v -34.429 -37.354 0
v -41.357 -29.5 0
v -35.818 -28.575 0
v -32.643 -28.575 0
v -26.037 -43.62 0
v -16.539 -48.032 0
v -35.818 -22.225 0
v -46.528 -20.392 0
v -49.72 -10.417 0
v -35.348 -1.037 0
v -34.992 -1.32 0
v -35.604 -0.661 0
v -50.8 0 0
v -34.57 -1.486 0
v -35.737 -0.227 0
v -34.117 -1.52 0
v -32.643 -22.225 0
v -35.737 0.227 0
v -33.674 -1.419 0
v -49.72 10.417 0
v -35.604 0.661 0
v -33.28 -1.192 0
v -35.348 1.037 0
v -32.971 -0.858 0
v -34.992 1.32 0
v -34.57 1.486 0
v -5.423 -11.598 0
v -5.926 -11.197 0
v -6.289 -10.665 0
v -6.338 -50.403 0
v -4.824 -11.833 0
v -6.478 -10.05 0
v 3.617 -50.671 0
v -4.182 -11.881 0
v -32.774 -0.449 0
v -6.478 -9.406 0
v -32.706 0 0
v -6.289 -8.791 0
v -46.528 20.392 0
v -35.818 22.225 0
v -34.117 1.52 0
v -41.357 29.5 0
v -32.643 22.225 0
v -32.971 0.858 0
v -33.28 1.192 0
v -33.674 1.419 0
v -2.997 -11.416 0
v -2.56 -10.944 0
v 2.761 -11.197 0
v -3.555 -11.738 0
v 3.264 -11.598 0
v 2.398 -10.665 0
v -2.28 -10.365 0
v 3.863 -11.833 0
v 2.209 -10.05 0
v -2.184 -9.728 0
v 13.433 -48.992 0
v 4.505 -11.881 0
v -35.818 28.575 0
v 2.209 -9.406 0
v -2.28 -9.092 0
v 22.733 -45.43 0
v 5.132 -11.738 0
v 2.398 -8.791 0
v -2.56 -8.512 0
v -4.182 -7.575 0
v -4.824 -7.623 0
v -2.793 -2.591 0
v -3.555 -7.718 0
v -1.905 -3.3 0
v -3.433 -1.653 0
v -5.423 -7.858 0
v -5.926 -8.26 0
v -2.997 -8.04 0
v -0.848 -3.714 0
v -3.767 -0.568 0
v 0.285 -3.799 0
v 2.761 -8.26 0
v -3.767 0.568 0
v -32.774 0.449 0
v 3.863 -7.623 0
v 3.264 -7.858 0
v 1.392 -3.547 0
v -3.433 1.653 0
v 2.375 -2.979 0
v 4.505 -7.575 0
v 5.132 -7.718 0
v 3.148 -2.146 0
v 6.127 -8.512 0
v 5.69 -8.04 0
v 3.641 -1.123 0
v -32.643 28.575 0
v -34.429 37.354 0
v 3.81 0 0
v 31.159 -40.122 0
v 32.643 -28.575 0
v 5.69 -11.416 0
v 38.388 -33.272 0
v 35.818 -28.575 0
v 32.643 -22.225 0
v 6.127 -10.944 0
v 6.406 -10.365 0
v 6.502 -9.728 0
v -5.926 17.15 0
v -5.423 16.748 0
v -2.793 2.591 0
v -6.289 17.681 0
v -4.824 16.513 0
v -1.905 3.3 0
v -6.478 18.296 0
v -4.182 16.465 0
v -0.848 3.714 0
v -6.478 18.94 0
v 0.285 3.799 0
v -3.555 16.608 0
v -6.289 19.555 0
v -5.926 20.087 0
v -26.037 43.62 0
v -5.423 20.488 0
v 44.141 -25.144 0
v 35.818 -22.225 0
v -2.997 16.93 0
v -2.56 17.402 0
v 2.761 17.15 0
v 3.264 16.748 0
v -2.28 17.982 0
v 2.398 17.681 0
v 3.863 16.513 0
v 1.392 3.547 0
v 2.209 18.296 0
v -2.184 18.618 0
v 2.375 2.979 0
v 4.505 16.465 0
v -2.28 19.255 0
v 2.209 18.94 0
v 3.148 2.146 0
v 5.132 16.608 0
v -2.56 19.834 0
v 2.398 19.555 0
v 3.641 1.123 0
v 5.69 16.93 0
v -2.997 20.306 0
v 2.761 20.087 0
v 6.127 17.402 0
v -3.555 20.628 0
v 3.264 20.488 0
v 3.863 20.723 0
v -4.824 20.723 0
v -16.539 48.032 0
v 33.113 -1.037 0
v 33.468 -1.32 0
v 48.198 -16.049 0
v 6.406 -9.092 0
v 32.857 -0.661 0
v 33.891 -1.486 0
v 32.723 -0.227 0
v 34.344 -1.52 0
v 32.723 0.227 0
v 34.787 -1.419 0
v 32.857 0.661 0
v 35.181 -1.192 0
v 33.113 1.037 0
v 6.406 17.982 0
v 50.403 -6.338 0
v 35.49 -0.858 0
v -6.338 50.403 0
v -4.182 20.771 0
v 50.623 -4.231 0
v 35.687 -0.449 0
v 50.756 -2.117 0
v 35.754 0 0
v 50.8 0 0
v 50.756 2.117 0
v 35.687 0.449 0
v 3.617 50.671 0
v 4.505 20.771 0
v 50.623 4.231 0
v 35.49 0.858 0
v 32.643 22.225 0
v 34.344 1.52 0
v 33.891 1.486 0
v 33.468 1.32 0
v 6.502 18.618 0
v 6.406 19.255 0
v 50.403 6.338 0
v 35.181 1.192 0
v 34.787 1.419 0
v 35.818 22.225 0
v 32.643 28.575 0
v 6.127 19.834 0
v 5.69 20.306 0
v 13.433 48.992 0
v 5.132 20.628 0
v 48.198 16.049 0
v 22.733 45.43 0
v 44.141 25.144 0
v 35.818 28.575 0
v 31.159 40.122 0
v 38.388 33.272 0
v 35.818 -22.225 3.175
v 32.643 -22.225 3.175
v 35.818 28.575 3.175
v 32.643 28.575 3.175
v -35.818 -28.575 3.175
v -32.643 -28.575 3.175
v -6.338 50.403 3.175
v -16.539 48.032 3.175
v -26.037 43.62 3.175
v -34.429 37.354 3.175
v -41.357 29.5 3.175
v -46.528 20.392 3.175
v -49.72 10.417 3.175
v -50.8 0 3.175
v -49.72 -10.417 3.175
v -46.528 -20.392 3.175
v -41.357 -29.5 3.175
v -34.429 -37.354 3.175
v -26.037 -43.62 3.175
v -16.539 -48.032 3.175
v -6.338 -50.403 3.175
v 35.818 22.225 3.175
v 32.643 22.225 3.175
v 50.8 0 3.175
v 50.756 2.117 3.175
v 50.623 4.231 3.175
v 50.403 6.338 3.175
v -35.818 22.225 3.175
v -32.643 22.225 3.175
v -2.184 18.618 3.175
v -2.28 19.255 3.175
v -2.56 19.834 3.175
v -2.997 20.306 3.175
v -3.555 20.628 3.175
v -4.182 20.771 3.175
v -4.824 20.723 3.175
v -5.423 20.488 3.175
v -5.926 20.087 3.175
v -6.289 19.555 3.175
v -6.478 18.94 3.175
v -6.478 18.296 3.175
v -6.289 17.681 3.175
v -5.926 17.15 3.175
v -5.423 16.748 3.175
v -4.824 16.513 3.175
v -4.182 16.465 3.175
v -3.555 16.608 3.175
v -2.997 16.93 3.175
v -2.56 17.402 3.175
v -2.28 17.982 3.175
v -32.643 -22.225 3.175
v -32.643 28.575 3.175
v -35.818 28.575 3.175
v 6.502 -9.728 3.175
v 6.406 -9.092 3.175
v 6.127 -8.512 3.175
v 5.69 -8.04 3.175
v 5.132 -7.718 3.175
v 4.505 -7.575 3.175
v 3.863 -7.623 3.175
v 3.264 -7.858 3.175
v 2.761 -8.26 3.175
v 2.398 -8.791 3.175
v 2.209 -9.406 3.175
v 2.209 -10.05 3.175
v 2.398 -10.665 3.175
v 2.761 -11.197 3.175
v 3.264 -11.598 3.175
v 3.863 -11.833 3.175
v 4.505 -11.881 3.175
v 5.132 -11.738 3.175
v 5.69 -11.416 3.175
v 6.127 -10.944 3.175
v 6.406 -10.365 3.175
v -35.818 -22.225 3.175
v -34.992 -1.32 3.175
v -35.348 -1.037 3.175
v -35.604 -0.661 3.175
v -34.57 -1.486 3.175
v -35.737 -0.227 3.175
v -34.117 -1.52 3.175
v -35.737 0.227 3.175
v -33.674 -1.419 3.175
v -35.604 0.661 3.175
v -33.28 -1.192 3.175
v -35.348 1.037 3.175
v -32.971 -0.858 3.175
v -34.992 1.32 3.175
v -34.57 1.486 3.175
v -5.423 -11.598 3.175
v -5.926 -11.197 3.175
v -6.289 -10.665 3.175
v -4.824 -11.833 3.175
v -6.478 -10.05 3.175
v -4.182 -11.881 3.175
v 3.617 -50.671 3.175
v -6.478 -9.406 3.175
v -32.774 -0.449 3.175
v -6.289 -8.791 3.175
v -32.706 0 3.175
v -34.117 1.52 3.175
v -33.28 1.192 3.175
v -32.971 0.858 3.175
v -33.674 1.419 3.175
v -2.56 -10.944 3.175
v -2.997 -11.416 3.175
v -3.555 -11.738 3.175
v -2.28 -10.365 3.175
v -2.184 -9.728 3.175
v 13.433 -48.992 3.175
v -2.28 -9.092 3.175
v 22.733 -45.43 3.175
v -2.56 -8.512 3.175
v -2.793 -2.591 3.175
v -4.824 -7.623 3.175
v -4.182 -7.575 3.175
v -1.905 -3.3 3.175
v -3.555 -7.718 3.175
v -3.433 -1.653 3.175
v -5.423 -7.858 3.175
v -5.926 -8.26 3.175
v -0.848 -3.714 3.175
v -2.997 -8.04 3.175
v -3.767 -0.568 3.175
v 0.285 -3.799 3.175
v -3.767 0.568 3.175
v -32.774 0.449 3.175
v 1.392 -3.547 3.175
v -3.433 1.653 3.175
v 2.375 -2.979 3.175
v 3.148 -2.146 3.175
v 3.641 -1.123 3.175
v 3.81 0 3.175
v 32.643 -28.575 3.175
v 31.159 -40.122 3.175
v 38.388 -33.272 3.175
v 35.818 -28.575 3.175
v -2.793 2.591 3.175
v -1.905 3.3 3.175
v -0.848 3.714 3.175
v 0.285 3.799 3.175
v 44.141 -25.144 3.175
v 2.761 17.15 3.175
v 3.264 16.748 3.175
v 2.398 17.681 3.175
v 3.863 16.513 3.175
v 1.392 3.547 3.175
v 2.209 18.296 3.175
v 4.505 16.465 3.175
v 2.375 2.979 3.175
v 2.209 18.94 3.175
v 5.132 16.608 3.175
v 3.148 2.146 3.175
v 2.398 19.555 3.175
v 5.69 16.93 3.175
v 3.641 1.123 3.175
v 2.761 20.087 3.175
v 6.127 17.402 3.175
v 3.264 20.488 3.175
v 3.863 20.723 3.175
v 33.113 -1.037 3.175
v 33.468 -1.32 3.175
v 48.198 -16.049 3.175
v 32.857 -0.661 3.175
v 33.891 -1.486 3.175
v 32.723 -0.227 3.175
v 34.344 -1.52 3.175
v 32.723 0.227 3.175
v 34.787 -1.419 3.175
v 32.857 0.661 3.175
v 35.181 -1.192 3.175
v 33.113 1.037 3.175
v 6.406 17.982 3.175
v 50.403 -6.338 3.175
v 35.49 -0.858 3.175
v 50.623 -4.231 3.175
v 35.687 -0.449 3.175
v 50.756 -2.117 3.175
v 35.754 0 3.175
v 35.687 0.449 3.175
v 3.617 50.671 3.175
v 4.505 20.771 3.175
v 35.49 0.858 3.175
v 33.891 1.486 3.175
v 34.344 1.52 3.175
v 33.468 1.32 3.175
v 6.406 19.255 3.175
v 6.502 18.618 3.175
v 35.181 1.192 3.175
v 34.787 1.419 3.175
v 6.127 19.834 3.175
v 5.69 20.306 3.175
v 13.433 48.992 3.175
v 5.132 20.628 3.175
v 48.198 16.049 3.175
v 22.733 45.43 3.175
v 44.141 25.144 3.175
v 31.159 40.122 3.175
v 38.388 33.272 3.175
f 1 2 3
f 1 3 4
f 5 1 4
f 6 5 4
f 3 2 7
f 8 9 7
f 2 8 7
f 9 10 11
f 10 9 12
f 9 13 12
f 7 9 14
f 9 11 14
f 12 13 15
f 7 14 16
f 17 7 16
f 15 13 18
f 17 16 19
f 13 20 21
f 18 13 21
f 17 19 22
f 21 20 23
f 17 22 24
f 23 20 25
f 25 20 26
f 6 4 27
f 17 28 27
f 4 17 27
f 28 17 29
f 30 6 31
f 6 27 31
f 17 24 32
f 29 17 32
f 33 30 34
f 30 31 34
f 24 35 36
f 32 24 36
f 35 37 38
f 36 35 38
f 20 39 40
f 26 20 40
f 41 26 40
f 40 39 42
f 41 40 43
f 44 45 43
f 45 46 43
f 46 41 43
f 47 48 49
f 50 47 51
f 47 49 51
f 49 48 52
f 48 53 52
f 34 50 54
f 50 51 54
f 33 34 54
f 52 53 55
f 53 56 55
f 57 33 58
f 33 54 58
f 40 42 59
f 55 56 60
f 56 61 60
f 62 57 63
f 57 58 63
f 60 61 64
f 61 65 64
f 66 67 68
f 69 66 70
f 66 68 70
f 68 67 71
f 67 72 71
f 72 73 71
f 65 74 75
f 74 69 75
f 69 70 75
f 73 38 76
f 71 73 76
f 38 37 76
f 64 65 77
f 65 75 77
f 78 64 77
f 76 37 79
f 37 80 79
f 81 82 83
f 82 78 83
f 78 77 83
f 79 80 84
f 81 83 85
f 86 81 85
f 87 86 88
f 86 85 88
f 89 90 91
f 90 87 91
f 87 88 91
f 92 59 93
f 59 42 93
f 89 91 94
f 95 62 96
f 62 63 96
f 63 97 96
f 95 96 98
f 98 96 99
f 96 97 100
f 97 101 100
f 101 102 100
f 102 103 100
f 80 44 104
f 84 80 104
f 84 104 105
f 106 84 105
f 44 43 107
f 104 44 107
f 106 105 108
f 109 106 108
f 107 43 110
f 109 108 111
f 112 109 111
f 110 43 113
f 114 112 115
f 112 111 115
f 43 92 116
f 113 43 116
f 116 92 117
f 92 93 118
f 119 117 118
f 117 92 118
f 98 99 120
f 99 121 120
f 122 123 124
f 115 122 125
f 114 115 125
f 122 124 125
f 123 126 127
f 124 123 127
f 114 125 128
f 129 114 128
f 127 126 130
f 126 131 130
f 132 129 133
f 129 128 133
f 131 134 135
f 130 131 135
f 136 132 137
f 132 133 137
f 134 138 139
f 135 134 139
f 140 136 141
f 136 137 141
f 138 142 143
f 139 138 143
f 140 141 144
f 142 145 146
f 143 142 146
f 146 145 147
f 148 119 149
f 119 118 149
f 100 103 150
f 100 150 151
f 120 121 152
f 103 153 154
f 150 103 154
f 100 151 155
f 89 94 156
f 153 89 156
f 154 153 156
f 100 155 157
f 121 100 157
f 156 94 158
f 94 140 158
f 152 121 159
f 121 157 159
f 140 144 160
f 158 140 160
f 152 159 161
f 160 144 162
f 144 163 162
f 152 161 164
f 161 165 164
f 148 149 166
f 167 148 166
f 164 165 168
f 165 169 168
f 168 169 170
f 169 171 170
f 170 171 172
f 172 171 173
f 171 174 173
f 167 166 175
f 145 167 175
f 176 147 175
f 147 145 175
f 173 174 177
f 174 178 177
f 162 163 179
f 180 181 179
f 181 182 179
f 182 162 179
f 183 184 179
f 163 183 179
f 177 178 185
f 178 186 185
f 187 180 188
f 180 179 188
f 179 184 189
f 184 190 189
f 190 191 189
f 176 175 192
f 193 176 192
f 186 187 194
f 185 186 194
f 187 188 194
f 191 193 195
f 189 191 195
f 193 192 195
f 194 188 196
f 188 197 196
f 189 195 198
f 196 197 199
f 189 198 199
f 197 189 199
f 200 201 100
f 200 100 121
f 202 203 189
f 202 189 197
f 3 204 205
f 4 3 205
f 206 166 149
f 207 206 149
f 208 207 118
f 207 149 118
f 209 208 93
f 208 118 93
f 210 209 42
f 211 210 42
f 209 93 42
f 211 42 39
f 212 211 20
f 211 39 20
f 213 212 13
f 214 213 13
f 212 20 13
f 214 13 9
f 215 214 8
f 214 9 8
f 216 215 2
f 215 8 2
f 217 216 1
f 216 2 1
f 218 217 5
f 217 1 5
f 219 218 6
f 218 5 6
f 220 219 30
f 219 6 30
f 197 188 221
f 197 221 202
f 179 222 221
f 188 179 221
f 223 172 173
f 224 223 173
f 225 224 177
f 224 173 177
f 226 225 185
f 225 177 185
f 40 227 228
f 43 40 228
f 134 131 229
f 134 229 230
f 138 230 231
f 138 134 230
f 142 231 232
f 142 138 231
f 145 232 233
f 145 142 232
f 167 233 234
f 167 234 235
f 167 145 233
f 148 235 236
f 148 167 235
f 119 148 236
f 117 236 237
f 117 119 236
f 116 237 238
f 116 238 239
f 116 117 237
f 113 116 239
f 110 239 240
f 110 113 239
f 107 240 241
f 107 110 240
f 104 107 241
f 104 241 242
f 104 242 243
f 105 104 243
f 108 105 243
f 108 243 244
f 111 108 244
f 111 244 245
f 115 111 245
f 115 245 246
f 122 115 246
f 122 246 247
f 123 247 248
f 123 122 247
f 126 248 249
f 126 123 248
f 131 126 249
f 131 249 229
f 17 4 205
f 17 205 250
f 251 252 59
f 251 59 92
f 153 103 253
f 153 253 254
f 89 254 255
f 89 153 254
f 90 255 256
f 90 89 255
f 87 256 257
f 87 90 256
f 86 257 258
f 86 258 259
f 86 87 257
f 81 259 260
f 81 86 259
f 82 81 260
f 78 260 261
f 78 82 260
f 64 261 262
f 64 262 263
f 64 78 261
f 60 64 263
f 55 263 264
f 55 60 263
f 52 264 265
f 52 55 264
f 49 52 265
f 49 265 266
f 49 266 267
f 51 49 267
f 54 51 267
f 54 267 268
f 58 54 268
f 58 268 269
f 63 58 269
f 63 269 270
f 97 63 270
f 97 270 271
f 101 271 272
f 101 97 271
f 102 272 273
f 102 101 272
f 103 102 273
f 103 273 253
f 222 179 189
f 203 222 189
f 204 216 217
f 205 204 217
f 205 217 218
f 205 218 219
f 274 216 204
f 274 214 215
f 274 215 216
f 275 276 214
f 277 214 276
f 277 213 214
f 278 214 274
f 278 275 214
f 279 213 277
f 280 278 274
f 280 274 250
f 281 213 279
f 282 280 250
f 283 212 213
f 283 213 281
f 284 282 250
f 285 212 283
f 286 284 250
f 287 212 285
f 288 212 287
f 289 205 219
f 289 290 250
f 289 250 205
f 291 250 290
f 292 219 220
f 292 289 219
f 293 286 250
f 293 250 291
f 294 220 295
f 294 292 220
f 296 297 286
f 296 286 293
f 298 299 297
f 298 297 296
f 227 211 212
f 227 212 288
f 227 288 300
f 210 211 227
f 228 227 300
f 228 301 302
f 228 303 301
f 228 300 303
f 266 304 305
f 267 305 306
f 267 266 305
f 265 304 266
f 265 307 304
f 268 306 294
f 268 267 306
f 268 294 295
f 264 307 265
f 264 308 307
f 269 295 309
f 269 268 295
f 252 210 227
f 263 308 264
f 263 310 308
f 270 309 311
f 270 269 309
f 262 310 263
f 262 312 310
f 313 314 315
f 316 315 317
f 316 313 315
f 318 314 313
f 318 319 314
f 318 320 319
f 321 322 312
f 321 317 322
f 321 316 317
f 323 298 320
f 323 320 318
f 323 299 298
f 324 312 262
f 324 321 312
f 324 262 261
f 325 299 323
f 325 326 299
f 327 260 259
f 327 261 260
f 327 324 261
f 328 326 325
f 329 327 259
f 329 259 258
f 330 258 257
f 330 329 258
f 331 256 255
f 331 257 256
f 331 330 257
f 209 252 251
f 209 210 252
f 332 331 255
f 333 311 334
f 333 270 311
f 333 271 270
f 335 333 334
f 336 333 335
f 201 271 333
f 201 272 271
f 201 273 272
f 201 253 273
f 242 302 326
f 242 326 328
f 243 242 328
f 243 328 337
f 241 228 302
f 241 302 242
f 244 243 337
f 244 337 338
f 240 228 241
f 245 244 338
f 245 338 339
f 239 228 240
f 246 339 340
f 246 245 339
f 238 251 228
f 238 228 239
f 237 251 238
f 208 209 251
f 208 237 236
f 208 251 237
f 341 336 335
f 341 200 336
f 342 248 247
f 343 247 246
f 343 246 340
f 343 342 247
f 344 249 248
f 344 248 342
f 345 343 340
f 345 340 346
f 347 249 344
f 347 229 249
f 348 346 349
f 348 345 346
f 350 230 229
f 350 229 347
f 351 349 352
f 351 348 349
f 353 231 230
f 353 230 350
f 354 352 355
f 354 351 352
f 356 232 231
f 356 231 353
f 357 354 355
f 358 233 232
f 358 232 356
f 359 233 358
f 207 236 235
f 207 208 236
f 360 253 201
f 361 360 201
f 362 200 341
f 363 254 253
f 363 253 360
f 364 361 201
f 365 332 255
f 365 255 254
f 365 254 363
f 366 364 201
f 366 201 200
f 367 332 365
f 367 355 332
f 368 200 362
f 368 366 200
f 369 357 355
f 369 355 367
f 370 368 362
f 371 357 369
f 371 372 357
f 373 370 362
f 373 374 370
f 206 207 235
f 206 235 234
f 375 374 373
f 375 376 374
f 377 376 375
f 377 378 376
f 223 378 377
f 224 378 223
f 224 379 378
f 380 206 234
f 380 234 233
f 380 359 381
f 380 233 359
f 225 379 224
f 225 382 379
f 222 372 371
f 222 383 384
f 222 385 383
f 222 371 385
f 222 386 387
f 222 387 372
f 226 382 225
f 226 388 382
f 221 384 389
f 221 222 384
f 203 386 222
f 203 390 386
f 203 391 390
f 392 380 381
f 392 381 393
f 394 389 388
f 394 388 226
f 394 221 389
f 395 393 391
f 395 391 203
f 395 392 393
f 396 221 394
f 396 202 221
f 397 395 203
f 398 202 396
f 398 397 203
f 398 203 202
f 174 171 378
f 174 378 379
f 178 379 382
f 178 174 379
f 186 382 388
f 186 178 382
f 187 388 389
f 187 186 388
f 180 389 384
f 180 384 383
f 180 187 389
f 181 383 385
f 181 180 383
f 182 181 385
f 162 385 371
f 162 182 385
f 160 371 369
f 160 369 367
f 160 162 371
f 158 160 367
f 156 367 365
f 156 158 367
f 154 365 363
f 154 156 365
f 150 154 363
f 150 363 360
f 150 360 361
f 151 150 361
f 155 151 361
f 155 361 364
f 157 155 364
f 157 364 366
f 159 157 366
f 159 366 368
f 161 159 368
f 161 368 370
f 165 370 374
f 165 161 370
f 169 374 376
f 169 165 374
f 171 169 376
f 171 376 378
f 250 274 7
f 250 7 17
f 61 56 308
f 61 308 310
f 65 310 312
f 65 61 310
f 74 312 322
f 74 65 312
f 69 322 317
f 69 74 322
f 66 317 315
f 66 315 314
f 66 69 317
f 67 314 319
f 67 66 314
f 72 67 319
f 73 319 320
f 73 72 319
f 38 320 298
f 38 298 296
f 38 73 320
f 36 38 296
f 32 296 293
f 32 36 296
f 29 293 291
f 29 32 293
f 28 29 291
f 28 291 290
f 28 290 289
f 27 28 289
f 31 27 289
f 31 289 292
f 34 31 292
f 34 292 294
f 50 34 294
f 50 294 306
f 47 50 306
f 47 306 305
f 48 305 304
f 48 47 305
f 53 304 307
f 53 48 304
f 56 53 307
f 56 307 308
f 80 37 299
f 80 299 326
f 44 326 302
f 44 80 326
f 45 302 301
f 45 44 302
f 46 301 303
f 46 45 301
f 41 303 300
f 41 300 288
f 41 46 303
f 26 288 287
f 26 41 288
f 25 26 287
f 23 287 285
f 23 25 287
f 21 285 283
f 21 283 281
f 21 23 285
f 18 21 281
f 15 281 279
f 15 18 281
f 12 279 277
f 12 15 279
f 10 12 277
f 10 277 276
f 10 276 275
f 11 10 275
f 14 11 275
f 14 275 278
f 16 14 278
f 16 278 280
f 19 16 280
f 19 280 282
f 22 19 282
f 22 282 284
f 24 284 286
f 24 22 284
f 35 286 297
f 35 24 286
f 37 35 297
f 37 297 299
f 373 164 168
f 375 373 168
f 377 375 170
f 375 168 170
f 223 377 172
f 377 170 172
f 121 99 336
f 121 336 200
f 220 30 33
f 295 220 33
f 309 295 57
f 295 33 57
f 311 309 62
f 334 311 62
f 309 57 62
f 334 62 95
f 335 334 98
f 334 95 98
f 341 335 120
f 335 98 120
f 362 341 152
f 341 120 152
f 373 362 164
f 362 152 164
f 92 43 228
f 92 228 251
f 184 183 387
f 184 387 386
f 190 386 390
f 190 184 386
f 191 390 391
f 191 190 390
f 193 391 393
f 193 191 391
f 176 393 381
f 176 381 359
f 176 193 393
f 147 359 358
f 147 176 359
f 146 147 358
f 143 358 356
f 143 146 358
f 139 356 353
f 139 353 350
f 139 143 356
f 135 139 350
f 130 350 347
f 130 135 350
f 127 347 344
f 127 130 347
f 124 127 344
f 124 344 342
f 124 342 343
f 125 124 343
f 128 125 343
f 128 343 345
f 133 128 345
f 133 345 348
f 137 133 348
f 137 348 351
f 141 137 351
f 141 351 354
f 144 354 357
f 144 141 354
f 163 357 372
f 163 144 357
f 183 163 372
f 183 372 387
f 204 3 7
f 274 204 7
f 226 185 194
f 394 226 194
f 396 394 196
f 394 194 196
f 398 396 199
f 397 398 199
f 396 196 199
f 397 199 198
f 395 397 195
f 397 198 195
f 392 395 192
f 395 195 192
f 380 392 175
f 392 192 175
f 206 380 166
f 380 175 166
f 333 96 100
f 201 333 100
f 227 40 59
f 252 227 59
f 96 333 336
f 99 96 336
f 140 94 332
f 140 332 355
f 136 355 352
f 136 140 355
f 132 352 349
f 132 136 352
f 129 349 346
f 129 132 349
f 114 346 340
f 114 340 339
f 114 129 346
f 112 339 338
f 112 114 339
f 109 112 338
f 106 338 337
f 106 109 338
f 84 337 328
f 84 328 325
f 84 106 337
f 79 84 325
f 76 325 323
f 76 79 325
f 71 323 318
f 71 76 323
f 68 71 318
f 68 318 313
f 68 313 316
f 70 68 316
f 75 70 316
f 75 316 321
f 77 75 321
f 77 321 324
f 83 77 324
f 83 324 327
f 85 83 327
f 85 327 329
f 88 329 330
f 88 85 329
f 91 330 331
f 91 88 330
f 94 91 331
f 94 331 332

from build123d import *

# Parameters (mm, degrees)
F0_W     = 3.175
F0_H     = 6.35
F0_R     = 1.524
F0_R_2   = 2.159
F0_R_3   = 3.81
F1_DEPTH = 3.175


# Not quite as in the source:
# - a length typed as a fraction of an inch, garbled in the dataset ("3 / 203.2 mm" for 3/8 in), is restored


with BuildPart() as f1:
    # F0 (on Top) → F1 (new body)
    with BuildSketch(Plane.XY):
        with BuildLine():
            ThreePointArc((-50.403125, 6.3375855209), (-50.8, 0), (-50.403125, -6.3375855209))
            ThreePointArc((-50.403125, -6.3375855209), (-35.9210244843, -35.9210244843), (-6.3375855209, -50.403125))
            ThreePointArc((-6.3375855209, -50.403125), (0, -50.8), (6.3375855209, -50.403125))
            ThreePointArc((6.3375855209, -50.403125), (35.9210244843, -35.9210244843), (50.403125, -6.3375855209))
            ThreePointArc((50.403125, -6.3375855209), (50.700684167, -3.175), (50.8, 0))
            ThreePointArc((50.8, 0), (50.700684167, 3.175), (50.403125, 6.3375855209))
            ThreePointArc((50.403125, 6.3375855209), (35.9210244843, 35.9210244843), (6.3375855209, 50.403125))
            ThreePointArc((6.3375855209, 50.403125), (0, 50.8), (-6.3375855209, 50.403125))
            ThreePointArc((-6.3375855209, 50.403125), (-35.9210244843, 35.9210244843), (-50.403125, 6.3375855209))
        make_face()
        with Locations((-34.2304483056, -25.4)):
            Rectangle(F0_W, F0_H, mode=Mode.SUBTRACT)
        with Locations((-34.2304483056, 0)):
            Circle(F0_R, mode=Mode.SUBTRACT)
        with Locations((-4.3434, -9.7282)):
            Circle(F0_R_2, mode=Mode.SUBTRACT)
        Circle(F0_R_3, mode=Mode.SUBTRACT)
        with Locations((34.2304483056, -25.4)):
            Rectangle(F0_W, F0_H, mode=Mode.SUBTRACT)
        with Locations((4.3434, -9.7282)):
            Circle(F0_R_2, mode=Mode.SUBTRACT)
        with Locations((34.2304483056, 0)):
            Circle(F0_R, mode=Mode.SUBTRACT)
        with Locations((-34.2304483056, 25.4)):
            Rectangle(F0_W, F0_H, mode=Mode.SUBTRACT)
        with Locations((-4.3434, 18.6182)):
            Circle(F0_R_2, mode=Mode.SUBTRACT)
        with Locations((4.3434, 18.6182)):
            Circle(F0_R_2, mode=Mode.SUBTRACT)
        with Locations((34.2304483056, 25.4)):
            Rectangle(F0_W, F0_H, mode=Mode.SUBTRACT)
    extrude(amount=F1_DEPTH)


solid = f1.part
